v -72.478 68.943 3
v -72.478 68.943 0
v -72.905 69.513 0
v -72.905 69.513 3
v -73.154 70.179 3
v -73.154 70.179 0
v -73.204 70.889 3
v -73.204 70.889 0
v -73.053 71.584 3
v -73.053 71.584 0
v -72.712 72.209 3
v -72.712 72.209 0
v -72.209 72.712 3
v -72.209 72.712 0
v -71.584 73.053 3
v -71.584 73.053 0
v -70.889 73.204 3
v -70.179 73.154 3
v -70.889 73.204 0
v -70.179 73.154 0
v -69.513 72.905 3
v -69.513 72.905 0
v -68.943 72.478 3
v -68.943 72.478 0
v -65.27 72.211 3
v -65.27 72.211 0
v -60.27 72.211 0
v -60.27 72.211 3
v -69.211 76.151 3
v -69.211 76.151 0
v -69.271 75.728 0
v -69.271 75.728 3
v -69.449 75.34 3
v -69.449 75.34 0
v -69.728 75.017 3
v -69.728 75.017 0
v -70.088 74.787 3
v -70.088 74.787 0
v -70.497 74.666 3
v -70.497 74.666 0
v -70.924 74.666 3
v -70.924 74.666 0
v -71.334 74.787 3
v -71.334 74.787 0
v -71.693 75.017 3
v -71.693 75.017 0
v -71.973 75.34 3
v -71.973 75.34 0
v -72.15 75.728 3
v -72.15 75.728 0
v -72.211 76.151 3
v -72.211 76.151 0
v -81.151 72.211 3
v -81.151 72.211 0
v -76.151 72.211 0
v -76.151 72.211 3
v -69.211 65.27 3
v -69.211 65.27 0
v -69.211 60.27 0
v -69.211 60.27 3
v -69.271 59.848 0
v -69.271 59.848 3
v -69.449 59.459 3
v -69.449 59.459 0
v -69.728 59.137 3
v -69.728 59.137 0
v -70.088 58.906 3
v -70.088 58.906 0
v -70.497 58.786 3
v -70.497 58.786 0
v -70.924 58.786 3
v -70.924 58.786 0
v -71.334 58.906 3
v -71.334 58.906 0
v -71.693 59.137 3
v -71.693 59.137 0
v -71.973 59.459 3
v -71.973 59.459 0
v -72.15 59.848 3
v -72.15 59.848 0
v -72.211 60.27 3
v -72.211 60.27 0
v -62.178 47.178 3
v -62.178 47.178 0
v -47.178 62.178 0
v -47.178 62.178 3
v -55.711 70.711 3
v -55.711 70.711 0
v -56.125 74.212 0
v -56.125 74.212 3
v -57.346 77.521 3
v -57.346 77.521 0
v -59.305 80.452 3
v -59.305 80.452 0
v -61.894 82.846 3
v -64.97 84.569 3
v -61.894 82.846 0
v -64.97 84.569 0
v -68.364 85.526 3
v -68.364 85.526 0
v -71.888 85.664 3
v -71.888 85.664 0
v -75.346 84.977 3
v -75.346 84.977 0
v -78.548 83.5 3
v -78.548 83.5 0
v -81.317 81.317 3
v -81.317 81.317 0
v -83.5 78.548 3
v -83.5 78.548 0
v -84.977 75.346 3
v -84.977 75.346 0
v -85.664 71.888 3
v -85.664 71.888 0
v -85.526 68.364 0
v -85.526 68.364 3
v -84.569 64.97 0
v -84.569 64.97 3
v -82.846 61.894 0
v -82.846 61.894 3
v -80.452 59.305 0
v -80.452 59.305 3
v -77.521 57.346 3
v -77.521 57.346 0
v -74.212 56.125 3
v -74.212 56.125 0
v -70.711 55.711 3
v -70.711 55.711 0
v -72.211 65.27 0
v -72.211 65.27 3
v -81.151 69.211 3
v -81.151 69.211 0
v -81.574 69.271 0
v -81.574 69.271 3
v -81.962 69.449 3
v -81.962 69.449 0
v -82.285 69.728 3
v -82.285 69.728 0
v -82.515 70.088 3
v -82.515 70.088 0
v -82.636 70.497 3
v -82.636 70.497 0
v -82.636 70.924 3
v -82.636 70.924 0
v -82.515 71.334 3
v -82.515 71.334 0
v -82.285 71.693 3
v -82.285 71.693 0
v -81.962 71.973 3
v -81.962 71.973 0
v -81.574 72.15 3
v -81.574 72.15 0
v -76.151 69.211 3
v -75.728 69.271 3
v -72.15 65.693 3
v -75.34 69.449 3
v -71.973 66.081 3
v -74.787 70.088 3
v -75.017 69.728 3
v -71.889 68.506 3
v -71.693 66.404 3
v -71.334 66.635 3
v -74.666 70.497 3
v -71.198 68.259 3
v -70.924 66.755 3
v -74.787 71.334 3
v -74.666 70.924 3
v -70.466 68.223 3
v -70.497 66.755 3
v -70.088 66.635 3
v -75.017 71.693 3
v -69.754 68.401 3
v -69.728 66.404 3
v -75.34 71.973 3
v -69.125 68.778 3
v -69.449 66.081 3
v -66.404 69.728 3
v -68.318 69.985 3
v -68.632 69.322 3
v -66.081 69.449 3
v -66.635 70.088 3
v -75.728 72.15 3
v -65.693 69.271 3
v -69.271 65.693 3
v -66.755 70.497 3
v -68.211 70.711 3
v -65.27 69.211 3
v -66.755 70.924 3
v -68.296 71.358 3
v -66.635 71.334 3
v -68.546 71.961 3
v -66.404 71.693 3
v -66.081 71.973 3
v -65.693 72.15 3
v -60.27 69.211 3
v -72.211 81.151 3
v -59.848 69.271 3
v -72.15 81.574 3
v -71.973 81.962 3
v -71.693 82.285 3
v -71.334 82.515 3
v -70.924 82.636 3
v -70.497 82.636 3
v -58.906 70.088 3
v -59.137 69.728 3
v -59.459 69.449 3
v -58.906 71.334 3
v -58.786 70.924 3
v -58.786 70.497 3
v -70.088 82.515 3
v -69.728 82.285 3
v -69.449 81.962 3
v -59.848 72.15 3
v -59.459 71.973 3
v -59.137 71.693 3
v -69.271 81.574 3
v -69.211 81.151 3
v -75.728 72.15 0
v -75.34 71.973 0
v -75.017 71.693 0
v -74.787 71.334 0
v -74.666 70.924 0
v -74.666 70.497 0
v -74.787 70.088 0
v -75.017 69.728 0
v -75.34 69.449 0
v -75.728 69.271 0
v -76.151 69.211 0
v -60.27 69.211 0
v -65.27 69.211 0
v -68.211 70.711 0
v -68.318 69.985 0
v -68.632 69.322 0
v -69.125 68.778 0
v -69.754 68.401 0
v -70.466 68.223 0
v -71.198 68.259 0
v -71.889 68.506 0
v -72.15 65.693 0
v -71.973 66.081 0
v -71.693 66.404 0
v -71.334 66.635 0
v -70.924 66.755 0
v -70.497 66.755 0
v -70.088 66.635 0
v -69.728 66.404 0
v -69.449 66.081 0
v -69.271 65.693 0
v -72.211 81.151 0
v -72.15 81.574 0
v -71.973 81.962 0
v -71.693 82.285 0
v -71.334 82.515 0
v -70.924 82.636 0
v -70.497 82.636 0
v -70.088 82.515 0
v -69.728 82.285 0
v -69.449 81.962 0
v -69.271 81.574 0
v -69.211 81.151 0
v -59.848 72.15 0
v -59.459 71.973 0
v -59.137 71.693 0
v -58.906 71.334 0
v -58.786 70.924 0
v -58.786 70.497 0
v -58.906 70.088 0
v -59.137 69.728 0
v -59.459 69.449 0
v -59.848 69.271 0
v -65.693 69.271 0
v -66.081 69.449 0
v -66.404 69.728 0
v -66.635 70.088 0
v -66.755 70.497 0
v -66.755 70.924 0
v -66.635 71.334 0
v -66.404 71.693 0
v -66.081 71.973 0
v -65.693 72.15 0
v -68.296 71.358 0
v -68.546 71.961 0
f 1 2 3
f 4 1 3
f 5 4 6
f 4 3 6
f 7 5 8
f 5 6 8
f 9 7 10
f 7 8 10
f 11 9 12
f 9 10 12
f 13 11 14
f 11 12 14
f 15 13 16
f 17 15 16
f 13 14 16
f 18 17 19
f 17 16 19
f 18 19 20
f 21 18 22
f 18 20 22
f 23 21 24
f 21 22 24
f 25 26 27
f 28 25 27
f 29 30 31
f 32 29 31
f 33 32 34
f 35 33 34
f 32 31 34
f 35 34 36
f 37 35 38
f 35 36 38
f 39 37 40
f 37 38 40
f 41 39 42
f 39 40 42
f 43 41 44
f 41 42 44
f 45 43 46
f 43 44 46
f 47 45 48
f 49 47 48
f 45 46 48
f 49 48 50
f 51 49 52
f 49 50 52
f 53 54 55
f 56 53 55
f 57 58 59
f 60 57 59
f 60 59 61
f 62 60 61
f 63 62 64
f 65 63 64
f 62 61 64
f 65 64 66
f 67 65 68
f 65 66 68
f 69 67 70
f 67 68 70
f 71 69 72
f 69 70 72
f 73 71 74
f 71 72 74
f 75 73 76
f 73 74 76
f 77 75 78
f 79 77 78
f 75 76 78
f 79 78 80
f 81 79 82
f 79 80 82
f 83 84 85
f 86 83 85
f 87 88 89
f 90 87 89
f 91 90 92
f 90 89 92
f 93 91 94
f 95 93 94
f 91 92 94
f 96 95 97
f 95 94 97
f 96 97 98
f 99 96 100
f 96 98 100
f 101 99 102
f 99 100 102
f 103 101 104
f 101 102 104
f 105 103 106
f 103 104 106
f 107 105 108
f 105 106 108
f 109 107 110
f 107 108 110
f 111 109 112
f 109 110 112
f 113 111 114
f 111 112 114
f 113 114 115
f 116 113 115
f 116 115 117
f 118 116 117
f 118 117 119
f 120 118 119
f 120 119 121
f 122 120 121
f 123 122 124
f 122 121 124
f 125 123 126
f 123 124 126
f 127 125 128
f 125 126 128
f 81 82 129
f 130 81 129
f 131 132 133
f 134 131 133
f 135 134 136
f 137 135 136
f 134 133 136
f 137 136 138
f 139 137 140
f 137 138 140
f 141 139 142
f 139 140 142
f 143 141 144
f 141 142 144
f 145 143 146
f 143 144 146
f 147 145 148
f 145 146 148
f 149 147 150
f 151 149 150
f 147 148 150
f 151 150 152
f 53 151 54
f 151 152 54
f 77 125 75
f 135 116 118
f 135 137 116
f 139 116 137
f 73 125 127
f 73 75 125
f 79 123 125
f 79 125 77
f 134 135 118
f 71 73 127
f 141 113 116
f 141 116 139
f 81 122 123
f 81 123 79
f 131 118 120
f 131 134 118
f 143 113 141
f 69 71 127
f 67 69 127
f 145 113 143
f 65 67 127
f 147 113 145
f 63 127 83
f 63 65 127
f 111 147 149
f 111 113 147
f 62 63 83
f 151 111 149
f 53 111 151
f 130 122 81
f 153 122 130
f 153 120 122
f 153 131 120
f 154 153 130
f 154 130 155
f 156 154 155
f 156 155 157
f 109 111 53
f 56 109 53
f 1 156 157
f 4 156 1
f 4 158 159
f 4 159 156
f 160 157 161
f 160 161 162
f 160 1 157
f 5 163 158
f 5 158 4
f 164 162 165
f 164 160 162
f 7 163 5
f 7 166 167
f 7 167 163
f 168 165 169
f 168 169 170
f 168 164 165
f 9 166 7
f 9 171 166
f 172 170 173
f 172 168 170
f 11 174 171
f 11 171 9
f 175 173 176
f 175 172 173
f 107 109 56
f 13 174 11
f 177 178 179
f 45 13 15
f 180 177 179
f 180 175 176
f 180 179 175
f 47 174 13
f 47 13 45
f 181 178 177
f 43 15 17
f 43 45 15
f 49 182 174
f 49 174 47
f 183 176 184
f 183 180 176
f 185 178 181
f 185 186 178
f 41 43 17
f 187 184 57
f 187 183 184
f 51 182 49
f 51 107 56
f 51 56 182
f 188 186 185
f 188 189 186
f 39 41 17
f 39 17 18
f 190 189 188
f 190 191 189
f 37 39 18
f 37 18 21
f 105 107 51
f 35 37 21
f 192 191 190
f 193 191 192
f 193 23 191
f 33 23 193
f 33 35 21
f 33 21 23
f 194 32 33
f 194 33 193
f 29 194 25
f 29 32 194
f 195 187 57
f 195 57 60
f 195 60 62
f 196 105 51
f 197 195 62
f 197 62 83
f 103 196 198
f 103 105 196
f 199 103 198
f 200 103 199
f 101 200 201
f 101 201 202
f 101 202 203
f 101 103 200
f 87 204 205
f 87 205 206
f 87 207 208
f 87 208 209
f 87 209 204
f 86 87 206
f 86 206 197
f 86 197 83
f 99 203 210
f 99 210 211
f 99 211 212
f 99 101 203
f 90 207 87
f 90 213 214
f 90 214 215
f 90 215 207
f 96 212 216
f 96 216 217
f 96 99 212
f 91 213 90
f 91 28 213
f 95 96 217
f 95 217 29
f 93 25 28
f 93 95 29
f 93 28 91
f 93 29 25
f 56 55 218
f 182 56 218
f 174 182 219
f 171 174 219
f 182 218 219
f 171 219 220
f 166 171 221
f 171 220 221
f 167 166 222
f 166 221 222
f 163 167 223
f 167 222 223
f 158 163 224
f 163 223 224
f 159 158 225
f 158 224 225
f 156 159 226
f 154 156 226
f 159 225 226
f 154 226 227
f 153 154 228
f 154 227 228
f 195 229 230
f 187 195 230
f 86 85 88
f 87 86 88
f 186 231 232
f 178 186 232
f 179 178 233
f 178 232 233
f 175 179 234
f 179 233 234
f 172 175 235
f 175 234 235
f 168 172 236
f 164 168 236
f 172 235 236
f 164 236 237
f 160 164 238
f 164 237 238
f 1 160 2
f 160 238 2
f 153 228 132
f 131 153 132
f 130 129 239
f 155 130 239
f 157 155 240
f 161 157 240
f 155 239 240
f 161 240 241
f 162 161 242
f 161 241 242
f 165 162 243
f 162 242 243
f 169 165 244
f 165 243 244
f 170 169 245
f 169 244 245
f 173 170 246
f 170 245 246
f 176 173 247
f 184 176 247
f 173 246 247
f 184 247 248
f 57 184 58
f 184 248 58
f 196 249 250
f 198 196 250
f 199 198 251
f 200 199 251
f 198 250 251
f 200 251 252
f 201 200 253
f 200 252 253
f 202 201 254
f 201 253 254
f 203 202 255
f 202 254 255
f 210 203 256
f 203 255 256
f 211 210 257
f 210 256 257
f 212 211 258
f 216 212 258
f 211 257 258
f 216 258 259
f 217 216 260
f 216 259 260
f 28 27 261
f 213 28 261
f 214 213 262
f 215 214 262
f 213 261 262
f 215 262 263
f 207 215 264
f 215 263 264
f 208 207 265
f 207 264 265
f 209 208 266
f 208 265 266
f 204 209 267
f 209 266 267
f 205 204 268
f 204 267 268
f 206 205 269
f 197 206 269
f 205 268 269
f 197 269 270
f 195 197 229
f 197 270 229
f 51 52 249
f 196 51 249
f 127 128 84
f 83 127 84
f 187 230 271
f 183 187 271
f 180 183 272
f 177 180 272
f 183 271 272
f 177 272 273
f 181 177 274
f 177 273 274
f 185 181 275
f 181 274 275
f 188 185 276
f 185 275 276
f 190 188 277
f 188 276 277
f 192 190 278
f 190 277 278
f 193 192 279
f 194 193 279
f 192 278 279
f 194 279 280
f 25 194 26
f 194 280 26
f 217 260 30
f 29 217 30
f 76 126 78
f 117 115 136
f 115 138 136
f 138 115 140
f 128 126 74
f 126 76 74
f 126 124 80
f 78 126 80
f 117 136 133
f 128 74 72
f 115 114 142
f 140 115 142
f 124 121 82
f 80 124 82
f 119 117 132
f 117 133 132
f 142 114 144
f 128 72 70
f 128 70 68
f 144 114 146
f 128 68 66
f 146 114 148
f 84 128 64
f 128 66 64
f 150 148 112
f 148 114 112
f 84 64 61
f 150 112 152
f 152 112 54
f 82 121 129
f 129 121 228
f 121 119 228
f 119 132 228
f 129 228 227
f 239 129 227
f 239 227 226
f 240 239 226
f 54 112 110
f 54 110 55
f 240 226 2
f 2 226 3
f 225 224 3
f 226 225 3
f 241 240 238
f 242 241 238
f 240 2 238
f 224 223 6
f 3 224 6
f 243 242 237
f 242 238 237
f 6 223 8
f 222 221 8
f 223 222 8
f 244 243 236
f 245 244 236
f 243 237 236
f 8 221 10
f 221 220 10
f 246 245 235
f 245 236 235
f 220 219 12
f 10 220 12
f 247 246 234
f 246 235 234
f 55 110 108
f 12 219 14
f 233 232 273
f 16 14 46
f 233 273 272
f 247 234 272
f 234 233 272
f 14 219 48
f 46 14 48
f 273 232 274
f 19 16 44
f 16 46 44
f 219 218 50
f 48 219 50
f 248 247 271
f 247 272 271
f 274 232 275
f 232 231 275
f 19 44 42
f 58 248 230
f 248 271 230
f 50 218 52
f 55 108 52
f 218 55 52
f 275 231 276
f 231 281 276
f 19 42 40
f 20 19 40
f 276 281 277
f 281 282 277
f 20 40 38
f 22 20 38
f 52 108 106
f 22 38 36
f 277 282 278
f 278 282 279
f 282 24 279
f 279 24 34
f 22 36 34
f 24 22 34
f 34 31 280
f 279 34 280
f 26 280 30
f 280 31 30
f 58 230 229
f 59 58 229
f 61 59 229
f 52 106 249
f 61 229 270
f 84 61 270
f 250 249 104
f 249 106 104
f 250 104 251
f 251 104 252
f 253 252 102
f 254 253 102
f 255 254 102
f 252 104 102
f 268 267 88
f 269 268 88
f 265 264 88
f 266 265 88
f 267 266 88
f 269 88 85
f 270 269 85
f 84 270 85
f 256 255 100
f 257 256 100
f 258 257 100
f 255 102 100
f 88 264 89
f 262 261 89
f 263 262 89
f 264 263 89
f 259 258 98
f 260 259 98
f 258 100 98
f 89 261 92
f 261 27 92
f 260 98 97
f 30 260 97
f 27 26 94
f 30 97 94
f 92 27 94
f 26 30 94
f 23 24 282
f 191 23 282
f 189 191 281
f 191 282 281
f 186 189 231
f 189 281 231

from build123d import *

# Parameters (mm, degrees)
F1_DEPTH = 3


with BuildPart() as f1:
    # F0 (on Top) → F1 (new body)
    with BuildSketch(Plane.XY):
        with BuildLine():
            Line((-47.178107, 62.178107), (-55.710678, 70.710678))
            ThreePointArc((-55.710678, 70.710678), (-81.31728, 81.31728), (-70.710678, 55.710678))
            Line((-70.710678, 55.710678), (-62.178107, 47.178107))
            Line((-62.178107, 47.178107), (-47.178107, 62.178107))
        make_face()
        with BuildLine():
            ThreePointArc((-72.210678, 65.270315), (-70.710678, 66.770315), (-69.210678, 65.270315))
            Line((-69.210678, 65.270315), (-69.210678, 60.270315))
            ThreePointArc((-69.210678, 60.270315), (-70.710678, 58.770315), (-72.210678, 60.270315))
            Line((-72.210678, 60.270315), (-72.210678, 65.270315))
        make_face(mode=Mode.SUBTRACT)
        with BuildLine():
            ThreePointArc((-76.151041, 72.210678), (-74.651041, 70.710678), (-76.151041, 69.210678))
            Line((-76.151041, 69.210678), (-81.151041, 69.210678))
            ThreePointArc((-81.151041, 69.210678), (-82.651041, 70.710678), (-81.151041, 72.210678))
            Line((-81.151041, 72.210678), (-76.151041, 72.210678))
        make_face(mode=Mode.SUBTRACT)
        with BuildLine():
            ThreePointArc((-68.942911, 72.478445), (-68.400979, 71.667387), (-68.210678, 70.710678))
            ThreePointArc((-68.210678, 70.710678), (-69.75397, 68.400979), (-72.478445, 68.942911))
            ThreePointArc((-72.478445, 68.942911), (-72.478445, 72.478445), (-68.942911, 72.478445))
        make_face(mode=Mode.SUBTRACT)
        with BuildLine():
            Line((-69.210678, 81.151041), (-69.210678, 76.151041))
            ThreePointArc((-69.210678, 76.151041), (-70.710678, 74.651041), (-72.210678, 76.151041))
            Line((-72.210678, 76.151041), (-72.210678, 81.151041))
            ThreePointArc((-72.210678, 81.151041), (-70.710678, 82.651041), (-69.210678, 81.151041))
        make_face(mode=Mode.SUBTRACT)
        with BuildLine():
            Line((-60.270315, 69.210678), (-65.270315, 69.210678))
            ThreePointArc((-65.270315, 69.210678), (-66.770315, 70.710678), (-65.270315, 72.210678))
            Line((-65.270315, 72.210678), (-60.270315, 72.210678))
            ThreePointArc((-60.270315, 72.210678), (-58.770315, 70.710678), (-60.270315, 69.210678))
        make_face(mode=Mode.SUBTRACT)
    extrude(amount=F1_DEPTH)


solid = f1.part
